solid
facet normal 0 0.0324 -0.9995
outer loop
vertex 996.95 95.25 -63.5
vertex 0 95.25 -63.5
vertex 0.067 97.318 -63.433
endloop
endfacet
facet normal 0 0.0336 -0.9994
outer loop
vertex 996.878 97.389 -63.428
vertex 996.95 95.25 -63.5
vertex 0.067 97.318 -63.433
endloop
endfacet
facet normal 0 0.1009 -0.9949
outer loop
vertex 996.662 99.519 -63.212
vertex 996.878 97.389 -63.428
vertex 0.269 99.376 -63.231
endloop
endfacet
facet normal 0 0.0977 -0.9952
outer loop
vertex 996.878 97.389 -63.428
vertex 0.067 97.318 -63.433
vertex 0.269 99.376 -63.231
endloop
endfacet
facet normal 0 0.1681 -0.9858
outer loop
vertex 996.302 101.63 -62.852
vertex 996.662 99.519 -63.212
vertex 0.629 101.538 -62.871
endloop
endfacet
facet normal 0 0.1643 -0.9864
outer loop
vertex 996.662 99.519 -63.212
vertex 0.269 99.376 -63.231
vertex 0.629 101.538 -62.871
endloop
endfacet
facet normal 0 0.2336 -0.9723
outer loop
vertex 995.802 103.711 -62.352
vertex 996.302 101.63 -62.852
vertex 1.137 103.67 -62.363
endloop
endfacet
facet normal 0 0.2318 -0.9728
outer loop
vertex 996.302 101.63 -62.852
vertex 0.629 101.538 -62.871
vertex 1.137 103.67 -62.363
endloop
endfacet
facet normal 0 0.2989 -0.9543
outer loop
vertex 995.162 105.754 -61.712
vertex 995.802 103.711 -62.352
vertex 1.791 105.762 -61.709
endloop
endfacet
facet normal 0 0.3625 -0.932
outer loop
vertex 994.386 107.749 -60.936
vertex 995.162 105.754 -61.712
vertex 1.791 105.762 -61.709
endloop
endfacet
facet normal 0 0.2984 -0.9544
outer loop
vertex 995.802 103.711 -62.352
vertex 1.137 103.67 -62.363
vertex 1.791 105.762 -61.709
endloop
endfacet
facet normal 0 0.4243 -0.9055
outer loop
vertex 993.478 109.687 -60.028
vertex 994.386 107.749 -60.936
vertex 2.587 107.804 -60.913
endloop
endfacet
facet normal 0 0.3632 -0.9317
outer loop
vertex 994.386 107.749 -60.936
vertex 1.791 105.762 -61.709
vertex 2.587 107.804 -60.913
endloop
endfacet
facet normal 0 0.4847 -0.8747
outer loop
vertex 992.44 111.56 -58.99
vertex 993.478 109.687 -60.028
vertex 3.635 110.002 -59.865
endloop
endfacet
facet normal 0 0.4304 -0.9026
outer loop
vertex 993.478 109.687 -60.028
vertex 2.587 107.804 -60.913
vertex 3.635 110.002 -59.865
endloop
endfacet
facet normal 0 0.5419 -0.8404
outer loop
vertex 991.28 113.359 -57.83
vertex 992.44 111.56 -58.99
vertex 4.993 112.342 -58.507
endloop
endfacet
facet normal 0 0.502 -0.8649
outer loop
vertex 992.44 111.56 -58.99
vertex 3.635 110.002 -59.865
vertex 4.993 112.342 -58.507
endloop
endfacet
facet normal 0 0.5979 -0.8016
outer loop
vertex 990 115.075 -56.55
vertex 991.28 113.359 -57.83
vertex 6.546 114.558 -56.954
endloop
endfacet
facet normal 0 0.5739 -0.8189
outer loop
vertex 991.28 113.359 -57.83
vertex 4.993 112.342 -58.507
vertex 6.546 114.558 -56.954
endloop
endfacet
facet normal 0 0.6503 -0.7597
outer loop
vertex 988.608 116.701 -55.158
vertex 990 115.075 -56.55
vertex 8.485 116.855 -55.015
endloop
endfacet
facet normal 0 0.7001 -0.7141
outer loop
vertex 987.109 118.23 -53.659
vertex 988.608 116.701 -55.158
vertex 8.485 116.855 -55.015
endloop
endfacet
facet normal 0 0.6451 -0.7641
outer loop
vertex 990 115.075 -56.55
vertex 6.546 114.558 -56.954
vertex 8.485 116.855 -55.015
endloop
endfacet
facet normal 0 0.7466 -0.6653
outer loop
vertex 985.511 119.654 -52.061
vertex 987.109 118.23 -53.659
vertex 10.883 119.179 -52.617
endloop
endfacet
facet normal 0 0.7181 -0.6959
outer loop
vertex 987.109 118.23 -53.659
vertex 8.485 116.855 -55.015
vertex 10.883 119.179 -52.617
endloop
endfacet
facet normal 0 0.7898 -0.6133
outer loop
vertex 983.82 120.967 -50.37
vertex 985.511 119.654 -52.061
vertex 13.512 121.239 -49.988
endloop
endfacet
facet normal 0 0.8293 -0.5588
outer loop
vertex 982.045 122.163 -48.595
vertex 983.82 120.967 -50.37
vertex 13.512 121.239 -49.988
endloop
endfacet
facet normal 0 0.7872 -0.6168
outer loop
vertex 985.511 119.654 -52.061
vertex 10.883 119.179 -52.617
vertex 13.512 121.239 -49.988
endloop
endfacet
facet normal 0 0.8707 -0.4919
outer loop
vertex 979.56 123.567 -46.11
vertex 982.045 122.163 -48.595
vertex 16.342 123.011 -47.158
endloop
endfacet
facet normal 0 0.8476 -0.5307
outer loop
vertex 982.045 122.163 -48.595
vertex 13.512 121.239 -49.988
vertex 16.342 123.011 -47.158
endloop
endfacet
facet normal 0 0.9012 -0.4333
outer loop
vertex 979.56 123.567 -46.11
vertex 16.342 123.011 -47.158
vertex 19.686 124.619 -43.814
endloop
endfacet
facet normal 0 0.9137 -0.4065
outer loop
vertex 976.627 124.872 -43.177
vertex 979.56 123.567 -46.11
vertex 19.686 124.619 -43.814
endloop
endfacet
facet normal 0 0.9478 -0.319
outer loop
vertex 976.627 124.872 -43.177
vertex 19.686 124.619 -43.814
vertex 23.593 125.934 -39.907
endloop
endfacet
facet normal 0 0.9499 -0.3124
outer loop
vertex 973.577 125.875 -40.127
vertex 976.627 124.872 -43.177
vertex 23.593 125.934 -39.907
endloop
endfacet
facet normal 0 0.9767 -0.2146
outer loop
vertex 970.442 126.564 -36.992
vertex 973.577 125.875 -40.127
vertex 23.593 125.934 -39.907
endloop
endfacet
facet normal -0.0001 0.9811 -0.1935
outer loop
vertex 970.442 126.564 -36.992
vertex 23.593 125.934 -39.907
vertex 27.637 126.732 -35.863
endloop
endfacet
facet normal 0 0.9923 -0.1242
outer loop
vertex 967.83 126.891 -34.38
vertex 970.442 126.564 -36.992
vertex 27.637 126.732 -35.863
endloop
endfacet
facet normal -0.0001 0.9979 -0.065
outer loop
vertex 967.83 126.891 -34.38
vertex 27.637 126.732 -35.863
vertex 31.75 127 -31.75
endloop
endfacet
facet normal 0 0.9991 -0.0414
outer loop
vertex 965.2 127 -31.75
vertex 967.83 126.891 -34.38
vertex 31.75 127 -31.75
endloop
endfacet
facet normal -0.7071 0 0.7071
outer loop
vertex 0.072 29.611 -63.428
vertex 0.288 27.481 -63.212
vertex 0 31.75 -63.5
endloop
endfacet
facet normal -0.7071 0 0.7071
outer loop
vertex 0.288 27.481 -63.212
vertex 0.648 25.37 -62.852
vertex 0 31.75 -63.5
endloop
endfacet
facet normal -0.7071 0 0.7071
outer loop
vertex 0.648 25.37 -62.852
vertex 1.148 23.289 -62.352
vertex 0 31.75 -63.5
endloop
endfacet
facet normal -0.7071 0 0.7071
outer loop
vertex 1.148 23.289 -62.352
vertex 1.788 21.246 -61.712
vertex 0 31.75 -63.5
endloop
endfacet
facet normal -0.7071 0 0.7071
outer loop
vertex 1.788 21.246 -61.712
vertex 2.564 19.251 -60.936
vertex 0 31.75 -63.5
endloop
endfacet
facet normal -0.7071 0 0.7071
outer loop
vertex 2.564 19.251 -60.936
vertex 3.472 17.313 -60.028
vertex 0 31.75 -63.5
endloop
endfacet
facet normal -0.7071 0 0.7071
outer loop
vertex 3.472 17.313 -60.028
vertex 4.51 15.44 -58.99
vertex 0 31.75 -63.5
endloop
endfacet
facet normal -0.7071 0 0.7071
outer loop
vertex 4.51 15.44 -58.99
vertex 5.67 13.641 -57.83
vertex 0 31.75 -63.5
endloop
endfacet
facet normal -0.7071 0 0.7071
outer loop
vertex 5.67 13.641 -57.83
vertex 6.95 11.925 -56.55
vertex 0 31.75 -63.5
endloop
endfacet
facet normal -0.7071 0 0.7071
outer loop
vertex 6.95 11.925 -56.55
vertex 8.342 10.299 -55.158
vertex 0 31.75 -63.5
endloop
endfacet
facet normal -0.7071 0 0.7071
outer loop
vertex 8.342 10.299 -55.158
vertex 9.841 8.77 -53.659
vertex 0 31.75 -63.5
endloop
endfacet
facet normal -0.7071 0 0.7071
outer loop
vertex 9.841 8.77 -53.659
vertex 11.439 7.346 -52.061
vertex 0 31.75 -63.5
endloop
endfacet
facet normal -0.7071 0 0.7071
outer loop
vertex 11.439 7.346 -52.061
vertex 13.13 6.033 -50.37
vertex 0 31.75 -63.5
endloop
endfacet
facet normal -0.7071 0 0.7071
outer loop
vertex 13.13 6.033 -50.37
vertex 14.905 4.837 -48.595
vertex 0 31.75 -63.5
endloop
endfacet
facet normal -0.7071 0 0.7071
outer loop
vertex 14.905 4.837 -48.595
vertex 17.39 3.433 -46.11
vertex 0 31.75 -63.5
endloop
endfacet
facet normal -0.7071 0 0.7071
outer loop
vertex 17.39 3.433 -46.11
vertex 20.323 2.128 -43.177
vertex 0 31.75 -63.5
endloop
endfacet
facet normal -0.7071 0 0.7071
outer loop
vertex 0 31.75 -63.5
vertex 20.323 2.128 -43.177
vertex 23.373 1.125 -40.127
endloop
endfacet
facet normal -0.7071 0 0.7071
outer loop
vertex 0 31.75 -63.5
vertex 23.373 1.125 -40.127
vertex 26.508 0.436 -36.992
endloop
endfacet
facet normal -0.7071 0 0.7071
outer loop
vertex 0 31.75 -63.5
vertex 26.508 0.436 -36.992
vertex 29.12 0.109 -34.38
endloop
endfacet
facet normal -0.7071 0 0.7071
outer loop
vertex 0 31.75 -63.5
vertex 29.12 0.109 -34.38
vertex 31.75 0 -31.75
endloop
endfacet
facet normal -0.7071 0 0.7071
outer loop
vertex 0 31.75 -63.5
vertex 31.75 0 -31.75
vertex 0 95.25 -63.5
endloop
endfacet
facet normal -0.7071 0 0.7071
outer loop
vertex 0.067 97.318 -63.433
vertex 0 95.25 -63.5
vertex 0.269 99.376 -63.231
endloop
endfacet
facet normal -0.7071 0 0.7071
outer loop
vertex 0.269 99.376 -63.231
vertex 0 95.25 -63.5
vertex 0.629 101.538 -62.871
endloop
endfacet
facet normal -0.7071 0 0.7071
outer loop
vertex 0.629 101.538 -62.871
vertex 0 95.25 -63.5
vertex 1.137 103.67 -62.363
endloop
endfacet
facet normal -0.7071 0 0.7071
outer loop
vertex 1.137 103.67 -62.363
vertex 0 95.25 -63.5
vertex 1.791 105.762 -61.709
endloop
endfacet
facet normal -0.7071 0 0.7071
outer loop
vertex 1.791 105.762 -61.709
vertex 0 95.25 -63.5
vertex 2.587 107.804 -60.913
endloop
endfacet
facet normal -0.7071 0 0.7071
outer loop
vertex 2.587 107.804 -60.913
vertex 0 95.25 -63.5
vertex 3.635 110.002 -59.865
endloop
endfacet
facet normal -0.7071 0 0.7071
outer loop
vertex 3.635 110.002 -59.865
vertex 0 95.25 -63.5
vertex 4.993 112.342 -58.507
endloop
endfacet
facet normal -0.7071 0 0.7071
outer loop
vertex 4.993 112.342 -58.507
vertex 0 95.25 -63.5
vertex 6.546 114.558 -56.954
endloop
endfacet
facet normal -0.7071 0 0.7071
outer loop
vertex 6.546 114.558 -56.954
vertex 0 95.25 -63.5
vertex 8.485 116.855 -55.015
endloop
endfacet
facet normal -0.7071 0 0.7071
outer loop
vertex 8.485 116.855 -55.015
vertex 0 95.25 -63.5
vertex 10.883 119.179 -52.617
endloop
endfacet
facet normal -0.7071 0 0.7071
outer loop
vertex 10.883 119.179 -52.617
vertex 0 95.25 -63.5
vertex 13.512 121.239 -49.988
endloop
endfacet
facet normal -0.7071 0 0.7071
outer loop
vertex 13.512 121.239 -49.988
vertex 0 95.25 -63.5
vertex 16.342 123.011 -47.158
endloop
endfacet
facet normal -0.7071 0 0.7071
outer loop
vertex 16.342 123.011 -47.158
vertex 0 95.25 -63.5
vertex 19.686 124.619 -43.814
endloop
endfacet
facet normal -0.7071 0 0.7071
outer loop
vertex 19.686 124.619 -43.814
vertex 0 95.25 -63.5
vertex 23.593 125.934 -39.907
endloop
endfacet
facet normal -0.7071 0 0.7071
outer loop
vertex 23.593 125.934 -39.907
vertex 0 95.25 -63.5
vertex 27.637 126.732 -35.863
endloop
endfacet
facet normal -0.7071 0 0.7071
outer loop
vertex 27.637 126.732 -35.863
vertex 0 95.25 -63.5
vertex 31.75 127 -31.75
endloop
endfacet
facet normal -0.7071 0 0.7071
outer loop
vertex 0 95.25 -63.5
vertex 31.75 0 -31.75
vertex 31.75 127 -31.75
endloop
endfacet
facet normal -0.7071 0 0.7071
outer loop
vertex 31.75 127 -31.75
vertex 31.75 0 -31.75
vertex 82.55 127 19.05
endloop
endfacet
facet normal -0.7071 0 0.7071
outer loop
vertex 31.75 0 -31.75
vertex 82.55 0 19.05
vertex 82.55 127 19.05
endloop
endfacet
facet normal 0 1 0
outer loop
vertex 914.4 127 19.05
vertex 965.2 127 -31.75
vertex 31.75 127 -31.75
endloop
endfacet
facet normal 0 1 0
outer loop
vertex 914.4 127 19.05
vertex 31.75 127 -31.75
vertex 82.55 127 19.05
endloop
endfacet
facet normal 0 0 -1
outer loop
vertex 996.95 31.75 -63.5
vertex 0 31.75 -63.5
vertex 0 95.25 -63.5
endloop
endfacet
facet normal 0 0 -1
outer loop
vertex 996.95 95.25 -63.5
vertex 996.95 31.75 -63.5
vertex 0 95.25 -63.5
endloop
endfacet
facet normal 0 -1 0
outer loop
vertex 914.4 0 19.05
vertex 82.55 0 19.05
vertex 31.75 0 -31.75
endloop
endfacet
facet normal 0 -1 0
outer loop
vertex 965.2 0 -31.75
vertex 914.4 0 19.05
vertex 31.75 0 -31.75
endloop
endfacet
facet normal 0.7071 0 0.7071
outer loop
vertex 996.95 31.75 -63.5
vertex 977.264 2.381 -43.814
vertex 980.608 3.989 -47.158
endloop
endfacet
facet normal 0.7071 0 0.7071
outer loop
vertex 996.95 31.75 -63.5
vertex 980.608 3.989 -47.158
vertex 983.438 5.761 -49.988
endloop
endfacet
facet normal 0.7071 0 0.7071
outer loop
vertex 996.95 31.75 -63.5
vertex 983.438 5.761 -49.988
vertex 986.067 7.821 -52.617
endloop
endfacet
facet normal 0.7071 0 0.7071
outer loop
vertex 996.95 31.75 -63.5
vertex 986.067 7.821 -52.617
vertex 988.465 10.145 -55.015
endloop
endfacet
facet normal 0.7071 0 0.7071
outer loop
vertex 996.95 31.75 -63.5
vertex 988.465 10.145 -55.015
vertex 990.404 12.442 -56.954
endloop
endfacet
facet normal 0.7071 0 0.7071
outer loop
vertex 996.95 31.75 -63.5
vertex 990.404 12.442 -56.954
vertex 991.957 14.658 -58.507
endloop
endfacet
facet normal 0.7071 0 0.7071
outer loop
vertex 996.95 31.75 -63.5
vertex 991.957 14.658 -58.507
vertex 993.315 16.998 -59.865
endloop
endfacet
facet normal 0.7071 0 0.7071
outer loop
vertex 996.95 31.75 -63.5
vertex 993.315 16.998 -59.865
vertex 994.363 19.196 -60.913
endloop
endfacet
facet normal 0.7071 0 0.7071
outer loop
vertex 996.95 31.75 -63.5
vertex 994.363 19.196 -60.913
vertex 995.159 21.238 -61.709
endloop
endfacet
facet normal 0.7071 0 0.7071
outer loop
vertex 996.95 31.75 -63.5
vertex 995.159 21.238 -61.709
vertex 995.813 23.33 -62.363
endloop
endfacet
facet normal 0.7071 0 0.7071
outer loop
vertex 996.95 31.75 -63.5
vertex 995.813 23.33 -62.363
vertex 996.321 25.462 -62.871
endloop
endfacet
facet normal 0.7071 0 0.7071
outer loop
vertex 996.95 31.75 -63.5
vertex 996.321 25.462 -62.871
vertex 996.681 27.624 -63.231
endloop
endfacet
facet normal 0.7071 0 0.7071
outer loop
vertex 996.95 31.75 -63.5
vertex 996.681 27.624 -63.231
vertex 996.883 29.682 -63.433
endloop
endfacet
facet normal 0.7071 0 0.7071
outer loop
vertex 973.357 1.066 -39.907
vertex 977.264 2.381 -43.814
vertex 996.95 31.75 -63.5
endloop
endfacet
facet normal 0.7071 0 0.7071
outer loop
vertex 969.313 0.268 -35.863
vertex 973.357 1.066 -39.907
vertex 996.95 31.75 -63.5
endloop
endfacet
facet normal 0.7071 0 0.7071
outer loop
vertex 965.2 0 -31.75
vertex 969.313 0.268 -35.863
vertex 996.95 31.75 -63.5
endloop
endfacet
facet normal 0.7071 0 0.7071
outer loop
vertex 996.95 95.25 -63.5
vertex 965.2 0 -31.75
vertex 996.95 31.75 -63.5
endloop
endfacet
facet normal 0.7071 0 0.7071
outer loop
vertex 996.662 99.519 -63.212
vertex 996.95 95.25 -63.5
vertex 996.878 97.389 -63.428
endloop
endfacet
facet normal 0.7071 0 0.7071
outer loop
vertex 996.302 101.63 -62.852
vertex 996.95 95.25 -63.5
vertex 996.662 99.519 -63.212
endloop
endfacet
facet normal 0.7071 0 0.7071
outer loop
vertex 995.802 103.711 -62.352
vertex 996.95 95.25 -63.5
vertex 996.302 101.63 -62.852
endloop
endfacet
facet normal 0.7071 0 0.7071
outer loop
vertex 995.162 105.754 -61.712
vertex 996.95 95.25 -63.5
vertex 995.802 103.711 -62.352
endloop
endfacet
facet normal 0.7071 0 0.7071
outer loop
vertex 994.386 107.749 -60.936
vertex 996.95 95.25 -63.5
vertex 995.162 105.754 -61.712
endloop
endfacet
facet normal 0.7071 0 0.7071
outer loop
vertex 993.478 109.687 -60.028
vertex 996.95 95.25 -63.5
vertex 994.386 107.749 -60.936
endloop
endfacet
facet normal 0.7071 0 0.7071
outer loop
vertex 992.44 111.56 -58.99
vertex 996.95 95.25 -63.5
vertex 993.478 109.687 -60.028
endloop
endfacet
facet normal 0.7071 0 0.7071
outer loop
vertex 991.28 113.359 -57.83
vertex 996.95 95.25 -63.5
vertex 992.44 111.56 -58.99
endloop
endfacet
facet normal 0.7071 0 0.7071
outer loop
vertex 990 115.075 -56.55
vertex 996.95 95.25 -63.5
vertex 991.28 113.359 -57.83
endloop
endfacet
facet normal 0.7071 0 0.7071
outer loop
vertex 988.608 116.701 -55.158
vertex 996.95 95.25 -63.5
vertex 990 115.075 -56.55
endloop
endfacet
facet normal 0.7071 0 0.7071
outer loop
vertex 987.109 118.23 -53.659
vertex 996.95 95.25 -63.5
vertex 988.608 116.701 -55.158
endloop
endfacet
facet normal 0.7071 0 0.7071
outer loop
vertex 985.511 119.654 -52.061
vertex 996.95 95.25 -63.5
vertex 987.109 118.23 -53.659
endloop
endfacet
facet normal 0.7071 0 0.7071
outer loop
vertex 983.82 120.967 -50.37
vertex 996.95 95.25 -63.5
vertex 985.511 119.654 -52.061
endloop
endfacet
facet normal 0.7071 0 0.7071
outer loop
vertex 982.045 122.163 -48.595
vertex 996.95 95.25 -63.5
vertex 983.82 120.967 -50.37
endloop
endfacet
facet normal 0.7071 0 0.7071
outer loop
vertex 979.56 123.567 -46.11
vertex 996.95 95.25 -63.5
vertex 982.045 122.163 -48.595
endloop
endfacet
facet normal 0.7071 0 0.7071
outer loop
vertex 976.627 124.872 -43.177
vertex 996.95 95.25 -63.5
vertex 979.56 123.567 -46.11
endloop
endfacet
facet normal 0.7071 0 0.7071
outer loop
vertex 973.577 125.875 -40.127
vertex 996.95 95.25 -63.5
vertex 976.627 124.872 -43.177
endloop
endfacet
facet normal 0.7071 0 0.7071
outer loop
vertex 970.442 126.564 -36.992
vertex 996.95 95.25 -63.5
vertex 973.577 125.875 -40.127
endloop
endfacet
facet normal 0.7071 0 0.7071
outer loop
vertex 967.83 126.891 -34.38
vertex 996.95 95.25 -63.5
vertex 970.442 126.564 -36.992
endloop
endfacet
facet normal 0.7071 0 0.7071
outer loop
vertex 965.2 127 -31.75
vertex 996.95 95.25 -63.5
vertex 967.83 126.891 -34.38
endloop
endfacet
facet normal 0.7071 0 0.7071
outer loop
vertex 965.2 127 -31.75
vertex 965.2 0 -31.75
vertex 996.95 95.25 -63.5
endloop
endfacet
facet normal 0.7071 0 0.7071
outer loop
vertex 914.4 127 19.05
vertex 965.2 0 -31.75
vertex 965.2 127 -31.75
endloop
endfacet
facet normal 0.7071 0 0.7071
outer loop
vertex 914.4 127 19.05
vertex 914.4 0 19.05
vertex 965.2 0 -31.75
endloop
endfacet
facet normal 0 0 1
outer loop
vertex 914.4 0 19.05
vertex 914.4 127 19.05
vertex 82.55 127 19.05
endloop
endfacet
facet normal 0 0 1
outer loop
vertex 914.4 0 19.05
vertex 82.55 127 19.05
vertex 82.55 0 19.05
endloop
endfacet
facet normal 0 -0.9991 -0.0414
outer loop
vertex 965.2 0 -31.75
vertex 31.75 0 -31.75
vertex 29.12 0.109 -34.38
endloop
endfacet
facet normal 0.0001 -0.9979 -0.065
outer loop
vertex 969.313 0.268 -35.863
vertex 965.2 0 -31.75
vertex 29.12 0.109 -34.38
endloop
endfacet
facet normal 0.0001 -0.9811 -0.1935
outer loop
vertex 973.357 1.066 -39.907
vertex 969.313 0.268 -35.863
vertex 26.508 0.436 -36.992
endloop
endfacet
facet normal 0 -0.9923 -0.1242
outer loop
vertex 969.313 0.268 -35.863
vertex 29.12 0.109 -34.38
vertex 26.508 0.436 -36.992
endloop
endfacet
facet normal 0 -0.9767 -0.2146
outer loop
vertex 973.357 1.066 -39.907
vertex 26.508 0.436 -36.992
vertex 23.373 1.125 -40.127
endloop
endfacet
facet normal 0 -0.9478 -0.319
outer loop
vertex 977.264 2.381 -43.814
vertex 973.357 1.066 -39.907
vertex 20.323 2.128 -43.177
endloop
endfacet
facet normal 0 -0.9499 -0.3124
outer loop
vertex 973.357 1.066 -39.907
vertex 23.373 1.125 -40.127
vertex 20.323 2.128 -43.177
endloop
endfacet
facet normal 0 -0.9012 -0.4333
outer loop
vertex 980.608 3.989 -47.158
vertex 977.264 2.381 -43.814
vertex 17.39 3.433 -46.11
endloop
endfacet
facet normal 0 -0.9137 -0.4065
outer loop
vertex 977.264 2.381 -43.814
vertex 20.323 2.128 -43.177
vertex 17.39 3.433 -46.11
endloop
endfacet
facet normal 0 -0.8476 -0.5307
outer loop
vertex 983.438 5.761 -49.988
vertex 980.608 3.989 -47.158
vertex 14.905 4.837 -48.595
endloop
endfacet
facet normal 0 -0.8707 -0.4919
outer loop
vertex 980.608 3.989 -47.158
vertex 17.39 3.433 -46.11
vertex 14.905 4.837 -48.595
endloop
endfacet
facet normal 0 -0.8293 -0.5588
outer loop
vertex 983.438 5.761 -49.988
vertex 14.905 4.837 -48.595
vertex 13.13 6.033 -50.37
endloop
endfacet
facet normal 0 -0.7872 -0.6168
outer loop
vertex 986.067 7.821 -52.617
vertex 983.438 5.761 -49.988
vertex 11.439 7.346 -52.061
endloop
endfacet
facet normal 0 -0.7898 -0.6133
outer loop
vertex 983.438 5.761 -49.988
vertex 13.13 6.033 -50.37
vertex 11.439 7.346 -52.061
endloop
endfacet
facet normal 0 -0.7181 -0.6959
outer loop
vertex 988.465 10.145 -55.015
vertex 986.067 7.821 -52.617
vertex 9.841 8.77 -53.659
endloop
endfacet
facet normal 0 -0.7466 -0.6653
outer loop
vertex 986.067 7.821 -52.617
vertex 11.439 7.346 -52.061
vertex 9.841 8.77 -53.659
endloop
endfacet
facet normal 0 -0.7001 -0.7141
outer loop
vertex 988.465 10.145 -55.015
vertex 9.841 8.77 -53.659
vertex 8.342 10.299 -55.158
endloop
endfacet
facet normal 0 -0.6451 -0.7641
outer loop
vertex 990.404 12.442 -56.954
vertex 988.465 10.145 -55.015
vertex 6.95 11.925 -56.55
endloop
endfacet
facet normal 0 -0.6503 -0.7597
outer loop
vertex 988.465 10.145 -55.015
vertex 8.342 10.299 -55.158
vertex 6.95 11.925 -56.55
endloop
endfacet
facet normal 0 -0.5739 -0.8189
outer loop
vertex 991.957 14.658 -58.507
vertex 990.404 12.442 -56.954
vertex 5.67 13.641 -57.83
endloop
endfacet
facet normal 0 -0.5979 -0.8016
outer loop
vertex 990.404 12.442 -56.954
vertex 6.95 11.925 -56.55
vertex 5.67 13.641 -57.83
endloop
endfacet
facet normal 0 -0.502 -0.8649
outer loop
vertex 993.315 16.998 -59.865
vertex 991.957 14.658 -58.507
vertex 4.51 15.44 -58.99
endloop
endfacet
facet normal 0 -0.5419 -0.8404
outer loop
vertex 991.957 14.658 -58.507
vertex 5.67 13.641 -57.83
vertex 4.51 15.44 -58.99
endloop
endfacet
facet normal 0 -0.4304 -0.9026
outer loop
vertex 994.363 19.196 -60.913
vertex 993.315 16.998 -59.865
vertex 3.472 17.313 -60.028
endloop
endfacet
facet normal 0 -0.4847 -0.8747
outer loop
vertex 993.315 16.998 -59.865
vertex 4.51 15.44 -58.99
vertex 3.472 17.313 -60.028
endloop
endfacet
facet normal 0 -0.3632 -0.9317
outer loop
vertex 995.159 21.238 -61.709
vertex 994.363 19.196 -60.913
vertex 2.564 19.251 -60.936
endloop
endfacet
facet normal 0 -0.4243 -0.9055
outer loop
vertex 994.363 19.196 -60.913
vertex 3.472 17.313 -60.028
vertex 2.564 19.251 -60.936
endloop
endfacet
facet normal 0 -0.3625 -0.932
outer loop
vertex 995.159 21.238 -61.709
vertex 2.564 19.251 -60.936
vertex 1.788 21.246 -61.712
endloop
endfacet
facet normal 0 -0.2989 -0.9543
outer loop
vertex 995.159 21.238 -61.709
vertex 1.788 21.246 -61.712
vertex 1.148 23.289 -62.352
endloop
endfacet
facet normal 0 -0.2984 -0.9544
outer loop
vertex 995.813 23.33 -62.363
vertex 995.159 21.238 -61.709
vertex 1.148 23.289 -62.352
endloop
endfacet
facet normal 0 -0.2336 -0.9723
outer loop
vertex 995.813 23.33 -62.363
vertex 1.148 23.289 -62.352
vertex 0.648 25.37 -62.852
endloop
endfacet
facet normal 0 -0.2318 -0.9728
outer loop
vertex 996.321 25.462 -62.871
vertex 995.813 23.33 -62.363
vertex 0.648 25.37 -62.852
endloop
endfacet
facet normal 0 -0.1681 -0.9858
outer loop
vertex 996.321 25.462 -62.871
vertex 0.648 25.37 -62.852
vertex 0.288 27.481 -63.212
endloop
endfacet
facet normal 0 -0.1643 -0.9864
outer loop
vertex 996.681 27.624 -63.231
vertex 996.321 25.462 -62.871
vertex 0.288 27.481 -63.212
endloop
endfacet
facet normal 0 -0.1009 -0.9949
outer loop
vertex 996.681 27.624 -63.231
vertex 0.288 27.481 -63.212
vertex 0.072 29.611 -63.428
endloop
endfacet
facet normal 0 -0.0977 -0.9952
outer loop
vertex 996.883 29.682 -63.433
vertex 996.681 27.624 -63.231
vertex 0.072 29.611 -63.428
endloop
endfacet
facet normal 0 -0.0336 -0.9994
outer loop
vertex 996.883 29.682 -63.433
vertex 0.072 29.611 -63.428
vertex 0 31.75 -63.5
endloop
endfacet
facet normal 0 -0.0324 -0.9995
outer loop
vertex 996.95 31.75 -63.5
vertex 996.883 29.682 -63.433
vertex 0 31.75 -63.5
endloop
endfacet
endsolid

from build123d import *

# Parameters (mm, degrees)
BOSS_EXTRUDE1_DEPTH = 996.95
SKETCH2_W           = 344.402501539
SKETCH2_H           = 493.213131915
CUT_EXTRUDE1_DEPTH  = 59.371664787


with BuildPart() as part:
    # Sketch1 → Boss-Extrude1 (new body)
    with BuildSketch(Plane(origin=(0, 0, 0), x_dir=(0, 0, -1), z_dir=(1, 0, 0))):
        with BuildLine():
            Line((0, 0), (31.75, 0))
            ThreePointArc((31.75, 0), (54.200640303, 9.299359697), (63.5, 31.75))
            Line((63.5, 31.75), (63.5, 95.25))
            ThreePointArc((63.5, 95.25), (54.200640303, 117.700640303), (31.75, 127))
            Line((31.75, 127), (0, 127))
            Line((0, 127), (-19.05, 127))
            Line((-19.05, 127), (-19.05, 0))
            Line((-19.05, 0), (0, 0))
        make_face()
    extrude(amount=BOSS_EXTRUDE1_DEPTH)

    # Sketch2 → Cut-Extrude1 (cut, through all)
    with BuildSketch(Plane(origin=(466.725, 0, 466.725), x_dir=(0, 1, 0), z_dir=(0.707106781, 0, 0.707106781))):
        with Locations((32.995160032, -679.680893327)):
            Rectangle(SKETCH2_W, SKETCH2_H)
    cut_extrude1 = extrude(amount=CUT_EXTRUDE1_DEPTH, mode=Mode.SUBTRACT)

    # Mirror1: Cut-Extrude1 across plane
    add(cut_extrude1.mirror(Plane(origin=(498.475, 0, 0), x_dir=(0, 0, 1), z_dir=(1, 0, 0))), mode=Mode.SUBTRACT)


solid = part.part
